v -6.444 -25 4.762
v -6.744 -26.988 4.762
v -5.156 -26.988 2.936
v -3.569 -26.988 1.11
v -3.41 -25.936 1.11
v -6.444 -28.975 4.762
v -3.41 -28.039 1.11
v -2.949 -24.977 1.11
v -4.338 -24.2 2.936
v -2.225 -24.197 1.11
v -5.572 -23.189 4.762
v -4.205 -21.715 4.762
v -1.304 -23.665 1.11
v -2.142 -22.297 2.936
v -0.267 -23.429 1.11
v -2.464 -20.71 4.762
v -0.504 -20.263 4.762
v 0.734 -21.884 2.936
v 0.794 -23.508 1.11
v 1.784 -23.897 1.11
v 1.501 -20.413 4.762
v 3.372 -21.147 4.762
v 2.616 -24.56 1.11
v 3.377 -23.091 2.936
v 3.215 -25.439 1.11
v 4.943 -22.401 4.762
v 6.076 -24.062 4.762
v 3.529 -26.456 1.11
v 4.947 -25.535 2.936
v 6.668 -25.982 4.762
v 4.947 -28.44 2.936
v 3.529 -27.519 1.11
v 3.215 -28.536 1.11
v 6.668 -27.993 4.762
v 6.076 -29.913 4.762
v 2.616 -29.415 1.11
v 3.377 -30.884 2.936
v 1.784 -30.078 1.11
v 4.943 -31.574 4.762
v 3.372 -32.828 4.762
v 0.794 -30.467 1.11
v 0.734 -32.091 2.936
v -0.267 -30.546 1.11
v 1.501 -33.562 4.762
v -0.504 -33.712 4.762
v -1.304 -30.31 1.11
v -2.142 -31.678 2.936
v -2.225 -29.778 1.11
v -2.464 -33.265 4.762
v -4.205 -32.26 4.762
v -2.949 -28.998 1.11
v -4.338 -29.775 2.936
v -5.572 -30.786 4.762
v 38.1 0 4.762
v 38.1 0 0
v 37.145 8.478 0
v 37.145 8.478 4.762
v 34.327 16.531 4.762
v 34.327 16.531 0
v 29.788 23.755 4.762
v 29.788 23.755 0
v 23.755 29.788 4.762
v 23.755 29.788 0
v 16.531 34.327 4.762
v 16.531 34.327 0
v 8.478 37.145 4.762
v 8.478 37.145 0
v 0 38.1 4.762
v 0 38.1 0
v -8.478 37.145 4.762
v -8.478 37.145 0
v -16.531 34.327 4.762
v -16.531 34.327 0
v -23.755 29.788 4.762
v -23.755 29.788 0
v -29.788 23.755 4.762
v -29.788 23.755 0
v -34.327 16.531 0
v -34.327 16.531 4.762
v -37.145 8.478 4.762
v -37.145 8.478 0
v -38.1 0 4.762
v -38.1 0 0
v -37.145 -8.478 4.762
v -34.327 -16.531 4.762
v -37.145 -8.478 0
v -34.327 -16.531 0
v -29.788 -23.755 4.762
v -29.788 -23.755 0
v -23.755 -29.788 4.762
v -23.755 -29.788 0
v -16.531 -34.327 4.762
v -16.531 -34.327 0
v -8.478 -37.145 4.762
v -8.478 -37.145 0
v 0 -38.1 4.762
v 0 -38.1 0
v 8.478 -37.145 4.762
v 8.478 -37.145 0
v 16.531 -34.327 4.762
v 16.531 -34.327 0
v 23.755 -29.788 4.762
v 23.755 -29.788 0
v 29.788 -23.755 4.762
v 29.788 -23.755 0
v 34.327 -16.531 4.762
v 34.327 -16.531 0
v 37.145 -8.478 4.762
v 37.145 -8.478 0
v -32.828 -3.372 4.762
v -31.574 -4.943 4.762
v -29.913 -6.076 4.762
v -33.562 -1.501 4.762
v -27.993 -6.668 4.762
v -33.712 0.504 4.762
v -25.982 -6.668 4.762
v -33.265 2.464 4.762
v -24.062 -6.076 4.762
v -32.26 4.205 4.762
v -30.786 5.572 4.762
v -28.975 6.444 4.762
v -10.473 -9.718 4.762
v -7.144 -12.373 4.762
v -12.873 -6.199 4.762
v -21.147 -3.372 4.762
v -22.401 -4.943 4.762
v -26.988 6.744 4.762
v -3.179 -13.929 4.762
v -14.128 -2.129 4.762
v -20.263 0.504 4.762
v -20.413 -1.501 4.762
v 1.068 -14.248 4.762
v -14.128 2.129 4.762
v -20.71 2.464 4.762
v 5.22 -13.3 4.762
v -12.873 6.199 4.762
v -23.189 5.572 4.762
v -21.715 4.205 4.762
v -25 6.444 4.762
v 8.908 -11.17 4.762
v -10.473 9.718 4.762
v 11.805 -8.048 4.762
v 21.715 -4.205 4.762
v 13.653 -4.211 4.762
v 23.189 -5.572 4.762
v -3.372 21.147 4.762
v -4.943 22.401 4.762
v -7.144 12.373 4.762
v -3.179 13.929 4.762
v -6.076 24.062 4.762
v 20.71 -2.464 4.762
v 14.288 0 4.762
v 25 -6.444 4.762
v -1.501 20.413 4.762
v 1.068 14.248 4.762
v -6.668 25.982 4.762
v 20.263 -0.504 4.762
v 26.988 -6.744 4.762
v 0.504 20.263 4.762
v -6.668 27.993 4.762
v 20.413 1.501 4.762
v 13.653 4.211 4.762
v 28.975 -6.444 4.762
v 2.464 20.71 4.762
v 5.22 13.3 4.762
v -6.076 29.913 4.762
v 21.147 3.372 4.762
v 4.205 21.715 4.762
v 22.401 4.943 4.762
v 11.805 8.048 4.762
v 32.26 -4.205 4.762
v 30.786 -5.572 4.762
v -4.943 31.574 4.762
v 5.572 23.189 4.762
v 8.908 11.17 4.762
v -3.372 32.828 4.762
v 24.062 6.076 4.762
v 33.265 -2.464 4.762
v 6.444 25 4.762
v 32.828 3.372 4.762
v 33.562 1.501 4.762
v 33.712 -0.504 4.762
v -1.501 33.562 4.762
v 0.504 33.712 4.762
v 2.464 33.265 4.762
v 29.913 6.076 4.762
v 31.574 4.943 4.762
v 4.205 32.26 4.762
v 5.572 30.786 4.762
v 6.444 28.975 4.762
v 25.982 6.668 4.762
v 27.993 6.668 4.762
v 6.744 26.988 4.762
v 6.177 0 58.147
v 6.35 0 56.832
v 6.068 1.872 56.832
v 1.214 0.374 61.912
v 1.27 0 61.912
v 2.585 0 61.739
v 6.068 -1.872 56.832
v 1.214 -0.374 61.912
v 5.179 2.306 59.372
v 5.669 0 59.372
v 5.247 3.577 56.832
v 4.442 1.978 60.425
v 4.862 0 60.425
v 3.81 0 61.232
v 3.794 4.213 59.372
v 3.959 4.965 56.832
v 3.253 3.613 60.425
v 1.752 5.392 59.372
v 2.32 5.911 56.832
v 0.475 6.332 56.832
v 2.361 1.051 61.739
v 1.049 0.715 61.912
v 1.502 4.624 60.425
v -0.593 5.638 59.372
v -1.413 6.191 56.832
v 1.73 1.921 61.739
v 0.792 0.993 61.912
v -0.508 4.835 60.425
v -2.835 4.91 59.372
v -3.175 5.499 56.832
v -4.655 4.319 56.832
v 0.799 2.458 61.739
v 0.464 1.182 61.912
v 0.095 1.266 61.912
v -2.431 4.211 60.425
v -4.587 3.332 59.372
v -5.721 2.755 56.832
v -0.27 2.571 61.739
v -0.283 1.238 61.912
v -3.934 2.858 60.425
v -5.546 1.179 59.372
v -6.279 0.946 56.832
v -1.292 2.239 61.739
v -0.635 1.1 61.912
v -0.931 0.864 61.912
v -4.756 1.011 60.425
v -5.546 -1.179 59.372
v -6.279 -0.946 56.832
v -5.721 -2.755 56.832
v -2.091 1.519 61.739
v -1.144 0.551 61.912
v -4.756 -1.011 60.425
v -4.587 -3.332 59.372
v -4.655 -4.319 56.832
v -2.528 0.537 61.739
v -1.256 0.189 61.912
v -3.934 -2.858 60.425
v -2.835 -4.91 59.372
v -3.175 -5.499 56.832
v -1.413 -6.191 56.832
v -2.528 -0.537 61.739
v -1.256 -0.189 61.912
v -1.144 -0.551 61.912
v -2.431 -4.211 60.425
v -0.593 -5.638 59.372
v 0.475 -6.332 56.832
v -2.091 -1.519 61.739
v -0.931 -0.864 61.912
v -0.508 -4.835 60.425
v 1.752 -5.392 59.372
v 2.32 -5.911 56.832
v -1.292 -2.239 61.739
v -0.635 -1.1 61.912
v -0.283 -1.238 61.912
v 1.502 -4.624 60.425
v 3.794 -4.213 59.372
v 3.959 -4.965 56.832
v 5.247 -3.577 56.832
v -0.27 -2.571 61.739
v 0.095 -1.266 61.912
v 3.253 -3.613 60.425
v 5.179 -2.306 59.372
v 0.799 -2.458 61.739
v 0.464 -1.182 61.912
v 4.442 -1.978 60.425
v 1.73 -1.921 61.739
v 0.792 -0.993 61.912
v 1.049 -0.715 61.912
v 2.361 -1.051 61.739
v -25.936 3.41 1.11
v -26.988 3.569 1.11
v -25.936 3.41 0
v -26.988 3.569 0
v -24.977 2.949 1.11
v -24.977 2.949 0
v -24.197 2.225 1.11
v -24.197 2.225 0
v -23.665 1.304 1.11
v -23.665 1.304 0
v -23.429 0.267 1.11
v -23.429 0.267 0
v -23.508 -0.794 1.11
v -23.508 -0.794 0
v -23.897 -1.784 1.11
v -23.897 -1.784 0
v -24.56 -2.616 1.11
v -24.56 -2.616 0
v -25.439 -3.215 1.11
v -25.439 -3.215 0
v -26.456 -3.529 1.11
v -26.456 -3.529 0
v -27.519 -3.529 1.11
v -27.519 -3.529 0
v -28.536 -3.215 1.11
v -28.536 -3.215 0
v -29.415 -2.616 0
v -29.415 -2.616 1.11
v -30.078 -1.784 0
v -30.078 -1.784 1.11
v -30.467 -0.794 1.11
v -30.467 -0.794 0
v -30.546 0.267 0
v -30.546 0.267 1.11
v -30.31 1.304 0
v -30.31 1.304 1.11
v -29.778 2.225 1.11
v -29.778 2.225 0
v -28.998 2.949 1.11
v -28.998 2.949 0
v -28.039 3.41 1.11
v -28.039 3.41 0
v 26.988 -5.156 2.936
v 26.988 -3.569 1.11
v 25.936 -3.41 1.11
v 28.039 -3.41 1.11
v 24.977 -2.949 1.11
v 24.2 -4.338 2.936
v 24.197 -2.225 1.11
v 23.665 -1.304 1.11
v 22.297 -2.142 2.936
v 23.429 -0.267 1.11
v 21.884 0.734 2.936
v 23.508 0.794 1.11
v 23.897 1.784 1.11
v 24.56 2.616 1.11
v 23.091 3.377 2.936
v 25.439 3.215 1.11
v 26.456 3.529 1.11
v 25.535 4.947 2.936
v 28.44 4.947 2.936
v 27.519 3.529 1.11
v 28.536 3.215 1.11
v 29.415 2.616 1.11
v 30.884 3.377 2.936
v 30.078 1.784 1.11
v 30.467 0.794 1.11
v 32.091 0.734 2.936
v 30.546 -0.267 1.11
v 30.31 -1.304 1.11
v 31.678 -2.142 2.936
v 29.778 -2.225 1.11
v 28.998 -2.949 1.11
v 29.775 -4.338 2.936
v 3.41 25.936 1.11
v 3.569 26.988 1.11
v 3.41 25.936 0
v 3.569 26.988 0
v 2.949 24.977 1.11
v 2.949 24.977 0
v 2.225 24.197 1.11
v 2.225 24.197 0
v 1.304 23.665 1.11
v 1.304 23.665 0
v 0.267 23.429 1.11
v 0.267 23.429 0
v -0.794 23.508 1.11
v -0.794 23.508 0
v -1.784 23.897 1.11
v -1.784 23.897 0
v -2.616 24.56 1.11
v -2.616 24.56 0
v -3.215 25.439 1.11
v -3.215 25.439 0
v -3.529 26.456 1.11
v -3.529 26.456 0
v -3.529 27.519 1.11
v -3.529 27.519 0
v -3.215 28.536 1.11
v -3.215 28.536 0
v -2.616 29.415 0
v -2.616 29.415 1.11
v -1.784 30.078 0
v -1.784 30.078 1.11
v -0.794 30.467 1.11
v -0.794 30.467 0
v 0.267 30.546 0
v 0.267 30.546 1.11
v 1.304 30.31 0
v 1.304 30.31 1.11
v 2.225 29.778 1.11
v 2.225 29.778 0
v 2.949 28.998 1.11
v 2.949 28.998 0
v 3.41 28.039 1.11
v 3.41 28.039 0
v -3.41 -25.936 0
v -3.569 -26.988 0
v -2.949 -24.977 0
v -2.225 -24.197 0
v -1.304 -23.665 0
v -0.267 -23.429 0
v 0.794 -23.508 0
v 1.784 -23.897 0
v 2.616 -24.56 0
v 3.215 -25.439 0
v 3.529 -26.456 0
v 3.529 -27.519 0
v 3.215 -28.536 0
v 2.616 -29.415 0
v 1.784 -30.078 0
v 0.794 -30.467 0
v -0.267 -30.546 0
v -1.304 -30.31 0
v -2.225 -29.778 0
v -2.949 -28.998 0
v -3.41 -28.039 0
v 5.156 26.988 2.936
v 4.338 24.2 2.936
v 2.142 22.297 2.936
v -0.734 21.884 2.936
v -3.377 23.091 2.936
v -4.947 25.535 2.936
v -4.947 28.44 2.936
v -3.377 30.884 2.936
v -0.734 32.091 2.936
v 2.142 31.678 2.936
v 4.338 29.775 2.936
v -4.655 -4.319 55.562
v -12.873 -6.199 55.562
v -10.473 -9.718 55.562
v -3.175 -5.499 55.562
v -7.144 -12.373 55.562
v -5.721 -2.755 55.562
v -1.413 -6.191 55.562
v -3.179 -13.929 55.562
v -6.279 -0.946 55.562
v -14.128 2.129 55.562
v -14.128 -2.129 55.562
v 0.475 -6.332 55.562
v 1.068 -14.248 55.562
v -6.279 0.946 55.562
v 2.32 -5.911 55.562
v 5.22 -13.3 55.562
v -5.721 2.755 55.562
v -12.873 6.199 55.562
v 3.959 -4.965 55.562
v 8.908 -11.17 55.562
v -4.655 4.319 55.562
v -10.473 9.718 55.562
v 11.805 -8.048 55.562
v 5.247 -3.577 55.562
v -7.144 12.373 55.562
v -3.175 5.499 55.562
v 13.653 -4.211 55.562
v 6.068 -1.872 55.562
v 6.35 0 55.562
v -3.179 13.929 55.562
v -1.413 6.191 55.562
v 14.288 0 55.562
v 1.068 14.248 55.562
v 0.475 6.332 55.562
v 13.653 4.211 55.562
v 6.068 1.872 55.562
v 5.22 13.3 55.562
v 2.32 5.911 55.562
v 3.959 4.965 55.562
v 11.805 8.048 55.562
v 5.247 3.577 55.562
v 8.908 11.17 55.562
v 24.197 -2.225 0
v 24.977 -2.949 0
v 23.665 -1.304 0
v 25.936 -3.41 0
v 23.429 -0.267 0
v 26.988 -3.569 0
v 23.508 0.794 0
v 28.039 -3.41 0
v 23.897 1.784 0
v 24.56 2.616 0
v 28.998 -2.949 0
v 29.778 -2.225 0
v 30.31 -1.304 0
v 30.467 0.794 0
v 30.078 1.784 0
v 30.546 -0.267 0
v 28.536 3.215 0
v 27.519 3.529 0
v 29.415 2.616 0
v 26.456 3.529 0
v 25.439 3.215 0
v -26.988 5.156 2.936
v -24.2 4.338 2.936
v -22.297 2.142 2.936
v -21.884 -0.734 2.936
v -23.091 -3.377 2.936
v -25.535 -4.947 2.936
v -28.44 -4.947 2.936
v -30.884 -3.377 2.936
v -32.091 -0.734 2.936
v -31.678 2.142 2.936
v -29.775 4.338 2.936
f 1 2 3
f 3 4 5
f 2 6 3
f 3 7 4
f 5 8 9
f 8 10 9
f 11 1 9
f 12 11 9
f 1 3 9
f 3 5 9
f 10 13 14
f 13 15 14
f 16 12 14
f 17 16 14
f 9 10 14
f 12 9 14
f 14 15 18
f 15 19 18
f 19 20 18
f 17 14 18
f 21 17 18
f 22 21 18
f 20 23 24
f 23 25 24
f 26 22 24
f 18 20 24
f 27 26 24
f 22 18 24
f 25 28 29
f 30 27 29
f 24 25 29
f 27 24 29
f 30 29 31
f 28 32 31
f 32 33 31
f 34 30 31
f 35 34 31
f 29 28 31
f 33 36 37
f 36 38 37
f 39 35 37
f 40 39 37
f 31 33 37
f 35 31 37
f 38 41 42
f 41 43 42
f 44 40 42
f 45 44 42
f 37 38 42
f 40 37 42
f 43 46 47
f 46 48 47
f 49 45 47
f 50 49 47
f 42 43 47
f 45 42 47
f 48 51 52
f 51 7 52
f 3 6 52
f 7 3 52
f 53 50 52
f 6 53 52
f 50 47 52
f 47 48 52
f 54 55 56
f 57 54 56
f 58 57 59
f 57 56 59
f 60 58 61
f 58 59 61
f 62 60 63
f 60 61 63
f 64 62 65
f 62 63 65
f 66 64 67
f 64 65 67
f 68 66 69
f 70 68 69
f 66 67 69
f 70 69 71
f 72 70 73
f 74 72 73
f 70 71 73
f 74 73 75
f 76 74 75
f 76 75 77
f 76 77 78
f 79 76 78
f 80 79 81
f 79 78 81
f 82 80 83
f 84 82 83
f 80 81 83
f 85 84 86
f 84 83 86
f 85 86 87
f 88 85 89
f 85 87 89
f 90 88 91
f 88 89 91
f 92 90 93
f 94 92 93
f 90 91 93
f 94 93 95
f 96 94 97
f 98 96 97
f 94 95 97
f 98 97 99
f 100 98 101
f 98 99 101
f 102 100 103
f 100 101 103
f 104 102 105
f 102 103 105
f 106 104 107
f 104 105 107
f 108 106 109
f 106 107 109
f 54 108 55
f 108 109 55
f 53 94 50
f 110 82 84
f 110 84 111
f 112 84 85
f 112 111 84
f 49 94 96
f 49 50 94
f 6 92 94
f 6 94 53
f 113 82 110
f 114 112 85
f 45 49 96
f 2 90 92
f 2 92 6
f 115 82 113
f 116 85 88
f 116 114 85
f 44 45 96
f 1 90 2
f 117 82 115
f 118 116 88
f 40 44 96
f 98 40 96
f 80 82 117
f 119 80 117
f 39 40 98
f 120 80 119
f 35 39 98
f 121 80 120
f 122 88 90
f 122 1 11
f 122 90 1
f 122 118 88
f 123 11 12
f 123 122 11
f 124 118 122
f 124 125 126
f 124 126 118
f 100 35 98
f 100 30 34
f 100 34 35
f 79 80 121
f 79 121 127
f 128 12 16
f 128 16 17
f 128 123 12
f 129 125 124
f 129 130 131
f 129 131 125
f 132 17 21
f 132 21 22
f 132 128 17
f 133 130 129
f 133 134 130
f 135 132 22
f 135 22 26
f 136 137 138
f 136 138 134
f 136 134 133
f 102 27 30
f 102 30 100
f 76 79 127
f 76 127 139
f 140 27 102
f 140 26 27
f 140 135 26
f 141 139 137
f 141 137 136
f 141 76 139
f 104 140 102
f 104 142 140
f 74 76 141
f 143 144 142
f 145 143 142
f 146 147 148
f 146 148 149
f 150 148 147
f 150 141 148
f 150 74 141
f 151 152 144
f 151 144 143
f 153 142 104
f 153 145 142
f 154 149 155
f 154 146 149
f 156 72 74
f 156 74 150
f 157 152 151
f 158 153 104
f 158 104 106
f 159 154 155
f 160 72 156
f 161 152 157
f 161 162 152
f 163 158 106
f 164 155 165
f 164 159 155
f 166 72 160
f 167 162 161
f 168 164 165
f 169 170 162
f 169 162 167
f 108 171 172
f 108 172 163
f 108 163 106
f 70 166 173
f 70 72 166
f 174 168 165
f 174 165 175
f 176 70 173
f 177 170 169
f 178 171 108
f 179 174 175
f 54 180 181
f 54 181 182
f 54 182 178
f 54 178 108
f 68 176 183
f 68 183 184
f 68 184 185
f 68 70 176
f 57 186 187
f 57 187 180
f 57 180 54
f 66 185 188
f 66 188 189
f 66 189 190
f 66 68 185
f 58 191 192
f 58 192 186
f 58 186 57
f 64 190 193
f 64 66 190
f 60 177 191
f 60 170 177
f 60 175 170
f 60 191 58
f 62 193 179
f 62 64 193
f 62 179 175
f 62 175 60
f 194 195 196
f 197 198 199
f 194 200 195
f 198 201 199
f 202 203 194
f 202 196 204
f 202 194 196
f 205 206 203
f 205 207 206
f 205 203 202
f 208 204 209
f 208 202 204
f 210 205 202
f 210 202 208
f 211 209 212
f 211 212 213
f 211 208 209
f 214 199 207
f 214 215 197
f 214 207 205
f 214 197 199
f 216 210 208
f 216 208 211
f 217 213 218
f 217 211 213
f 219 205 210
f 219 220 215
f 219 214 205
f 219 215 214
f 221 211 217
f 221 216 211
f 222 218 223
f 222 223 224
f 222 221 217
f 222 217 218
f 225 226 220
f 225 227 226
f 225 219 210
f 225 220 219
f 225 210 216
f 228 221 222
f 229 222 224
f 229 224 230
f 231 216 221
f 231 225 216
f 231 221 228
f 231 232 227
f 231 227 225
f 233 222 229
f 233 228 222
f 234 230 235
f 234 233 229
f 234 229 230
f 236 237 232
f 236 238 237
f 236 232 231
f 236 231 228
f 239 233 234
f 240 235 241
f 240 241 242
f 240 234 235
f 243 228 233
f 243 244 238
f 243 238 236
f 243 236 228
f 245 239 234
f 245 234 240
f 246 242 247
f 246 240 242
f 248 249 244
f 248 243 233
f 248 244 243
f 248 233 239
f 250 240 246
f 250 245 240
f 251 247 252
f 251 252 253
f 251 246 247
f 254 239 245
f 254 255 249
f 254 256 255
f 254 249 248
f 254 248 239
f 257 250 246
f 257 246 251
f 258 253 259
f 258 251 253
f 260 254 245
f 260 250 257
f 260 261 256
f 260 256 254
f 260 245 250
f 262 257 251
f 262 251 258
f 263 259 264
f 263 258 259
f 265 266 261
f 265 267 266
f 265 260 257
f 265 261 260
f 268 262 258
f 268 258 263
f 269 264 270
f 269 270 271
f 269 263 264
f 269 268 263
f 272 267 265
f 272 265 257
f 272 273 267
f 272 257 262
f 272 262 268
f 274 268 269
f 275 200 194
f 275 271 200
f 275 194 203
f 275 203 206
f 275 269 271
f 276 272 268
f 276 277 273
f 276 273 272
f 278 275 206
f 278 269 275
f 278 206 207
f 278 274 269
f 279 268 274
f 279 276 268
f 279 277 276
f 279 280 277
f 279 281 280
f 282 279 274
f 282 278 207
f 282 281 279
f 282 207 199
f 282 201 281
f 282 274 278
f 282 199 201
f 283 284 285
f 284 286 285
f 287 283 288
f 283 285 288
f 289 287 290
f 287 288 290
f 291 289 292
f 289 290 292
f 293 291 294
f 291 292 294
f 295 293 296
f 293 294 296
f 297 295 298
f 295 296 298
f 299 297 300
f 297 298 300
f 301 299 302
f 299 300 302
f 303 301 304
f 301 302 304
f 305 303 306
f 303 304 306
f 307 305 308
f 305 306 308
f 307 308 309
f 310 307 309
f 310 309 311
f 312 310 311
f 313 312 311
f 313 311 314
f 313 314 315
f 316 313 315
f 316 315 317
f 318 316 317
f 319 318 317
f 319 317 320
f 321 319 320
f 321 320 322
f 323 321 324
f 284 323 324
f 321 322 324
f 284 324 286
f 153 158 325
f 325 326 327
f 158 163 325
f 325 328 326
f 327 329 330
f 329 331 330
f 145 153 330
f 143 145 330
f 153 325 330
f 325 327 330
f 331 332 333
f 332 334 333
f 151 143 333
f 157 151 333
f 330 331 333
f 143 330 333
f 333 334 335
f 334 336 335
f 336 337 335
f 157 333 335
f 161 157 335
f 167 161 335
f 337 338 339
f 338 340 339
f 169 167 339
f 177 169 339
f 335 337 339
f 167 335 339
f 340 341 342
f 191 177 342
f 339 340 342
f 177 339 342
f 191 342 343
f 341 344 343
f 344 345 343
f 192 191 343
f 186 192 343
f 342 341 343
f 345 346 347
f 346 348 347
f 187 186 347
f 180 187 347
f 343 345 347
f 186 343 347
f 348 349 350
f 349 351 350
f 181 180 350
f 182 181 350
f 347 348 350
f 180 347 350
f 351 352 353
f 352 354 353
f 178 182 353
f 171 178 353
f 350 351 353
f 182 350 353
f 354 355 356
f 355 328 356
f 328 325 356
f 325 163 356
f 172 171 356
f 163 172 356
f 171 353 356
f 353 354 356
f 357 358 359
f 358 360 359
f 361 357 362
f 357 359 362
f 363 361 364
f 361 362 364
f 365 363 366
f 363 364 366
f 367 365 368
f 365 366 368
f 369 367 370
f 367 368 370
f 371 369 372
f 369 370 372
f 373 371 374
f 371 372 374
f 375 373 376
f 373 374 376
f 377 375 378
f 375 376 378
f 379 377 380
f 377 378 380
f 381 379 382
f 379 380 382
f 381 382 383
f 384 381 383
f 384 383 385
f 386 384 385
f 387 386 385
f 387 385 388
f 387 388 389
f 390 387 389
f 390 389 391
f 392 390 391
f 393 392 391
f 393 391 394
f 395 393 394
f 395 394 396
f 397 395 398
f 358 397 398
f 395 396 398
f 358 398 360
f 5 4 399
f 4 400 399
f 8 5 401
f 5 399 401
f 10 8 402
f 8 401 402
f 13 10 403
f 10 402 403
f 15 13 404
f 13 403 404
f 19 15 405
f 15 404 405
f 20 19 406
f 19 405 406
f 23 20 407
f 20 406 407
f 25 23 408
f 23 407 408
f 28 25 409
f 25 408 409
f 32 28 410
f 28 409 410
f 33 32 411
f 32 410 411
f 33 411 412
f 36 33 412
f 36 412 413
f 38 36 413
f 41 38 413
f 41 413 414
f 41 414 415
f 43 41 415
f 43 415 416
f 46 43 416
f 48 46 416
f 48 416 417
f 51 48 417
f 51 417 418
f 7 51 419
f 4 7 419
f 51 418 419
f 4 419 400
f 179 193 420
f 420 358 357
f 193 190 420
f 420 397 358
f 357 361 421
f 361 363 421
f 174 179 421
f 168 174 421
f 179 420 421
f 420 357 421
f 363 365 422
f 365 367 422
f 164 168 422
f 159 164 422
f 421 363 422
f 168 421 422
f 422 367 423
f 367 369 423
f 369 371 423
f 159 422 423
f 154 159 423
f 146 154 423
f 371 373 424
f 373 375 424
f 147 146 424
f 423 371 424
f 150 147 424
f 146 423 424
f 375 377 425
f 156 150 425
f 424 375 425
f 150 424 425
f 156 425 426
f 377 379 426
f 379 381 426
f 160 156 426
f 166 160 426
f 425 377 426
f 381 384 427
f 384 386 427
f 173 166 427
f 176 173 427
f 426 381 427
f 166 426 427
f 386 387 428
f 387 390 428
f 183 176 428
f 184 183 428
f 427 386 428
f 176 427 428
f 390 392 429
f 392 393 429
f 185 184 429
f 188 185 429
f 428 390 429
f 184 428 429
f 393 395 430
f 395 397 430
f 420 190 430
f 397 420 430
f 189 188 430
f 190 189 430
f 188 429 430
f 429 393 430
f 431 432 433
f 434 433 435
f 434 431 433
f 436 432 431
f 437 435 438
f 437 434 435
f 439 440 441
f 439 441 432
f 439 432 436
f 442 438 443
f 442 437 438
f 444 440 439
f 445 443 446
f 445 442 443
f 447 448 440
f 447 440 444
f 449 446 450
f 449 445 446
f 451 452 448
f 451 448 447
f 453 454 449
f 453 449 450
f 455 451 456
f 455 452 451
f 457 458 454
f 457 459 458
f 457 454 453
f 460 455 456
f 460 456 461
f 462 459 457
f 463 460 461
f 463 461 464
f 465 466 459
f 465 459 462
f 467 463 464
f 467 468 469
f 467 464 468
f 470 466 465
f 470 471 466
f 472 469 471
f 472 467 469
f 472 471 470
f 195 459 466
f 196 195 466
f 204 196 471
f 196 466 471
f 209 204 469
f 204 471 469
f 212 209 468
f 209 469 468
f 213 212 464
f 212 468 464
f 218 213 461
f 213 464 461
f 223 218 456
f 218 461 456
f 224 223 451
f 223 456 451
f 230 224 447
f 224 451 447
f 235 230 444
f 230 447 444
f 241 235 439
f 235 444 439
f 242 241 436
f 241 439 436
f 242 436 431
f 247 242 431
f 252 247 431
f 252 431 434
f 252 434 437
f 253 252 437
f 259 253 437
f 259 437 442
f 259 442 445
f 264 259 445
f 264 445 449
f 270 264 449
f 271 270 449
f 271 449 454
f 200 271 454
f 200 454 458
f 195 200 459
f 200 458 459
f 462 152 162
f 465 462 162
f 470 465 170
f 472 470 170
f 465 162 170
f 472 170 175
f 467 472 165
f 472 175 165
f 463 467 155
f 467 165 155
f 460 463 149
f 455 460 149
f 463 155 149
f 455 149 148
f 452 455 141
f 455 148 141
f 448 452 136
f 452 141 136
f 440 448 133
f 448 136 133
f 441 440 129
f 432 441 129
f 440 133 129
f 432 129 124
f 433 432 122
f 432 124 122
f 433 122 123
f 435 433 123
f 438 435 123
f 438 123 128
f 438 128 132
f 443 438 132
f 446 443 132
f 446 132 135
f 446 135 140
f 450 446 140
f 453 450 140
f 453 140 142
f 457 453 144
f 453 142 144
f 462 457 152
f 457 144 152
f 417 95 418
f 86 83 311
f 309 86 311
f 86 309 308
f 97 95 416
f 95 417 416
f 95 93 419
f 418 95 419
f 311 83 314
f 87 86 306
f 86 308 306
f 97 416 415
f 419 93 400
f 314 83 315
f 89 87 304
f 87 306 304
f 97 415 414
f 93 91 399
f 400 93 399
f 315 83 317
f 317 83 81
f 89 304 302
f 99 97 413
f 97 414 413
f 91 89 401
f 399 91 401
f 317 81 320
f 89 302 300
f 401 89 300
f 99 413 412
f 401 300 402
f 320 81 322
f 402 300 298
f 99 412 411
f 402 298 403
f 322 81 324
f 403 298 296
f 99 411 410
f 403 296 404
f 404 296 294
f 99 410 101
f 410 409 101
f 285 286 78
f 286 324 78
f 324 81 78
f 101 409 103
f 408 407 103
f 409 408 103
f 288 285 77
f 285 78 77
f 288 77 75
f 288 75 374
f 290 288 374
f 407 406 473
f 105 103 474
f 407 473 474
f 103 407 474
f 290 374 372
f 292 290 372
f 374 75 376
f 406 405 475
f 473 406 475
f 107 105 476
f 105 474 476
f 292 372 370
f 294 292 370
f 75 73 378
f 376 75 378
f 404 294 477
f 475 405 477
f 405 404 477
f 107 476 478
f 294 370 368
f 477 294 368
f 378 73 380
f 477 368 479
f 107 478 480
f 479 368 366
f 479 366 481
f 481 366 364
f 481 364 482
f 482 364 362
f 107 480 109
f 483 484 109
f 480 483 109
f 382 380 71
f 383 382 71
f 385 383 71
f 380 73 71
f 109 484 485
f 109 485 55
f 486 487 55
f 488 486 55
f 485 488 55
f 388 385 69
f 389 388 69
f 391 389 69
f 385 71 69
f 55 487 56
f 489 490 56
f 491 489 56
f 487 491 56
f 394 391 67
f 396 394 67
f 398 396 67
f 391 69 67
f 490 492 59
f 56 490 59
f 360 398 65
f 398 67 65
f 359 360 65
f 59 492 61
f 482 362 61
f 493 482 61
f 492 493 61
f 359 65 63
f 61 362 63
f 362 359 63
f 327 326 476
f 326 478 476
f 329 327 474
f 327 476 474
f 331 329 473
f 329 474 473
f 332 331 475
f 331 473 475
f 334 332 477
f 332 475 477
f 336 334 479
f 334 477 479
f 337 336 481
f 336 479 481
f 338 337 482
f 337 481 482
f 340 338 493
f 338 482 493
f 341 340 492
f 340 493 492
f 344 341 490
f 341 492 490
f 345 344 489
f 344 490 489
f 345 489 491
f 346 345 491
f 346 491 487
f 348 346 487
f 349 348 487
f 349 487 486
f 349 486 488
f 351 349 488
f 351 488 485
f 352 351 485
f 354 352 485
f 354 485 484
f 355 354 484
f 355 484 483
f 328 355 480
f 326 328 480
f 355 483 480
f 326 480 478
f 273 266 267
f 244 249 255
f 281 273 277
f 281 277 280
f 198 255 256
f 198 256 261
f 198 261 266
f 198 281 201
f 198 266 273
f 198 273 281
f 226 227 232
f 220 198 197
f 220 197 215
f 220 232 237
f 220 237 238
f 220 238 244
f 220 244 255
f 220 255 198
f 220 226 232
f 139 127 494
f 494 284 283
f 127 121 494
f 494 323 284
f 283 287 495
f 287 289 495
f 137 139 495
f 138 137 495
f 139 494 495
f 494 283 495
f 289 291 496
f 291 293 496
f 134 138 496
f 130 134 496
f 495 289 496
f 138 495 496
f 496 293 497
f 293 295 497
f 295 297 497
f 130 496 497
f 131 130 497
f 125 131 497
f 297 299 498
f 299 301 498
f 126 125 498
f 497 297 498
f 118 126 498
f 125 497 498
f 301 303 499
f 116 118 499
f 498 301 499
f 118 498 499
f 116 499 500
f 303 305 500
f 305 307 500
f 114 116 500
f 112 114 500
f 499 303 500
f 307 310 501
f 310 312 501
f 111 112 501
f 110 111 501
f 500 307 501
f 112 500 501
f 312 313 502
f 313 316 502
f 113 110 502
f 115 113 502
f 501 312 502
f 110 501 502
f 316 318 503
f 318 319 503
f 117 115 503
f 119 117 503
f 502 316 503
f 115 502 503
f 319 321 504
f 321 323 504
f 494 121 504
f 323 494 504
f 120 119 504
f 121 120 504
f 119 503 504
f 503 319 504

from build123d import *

# Parameters (mm, degrees)
F0_R            = 38.1
F1_DEPTH        = 4.7625
F2_R            = 14.2875
F3_DEPTH        = 50.8
F4_R            = 6.35
F5_DEPTH        = 6.35
F6_R            = 5.08
F8_D            = 7.1374
F8_DEPTH        = 15.875
F8_CSINK_D      = 13.4874
F8_CSINK_ANGLE  = 82
F8_TIP          = 2.1442912911
F8_COPIES_COUNT = 4


# Not quite as in the source:
# - a pattern or mirror of a feature is missing from the dataset's text; its kind, count and spacing are read off the source's solid


with BuildPart() as f1:
    # F0 (on Top) → F1 (new body)
    with BuildSketch(Plane.XY):
        Circle(F0_R)
    extrude(amount=F1_DEPTH)

    # F2 (on face) → F3 (join)
    with BuildSketch(Plane.XY.offset(4.7625)):
        Circle(F2_R)
    extrude(amount=F3_DEPTH)

    # F4 (on face) → F5 (join)
    with BuildSketch(Plane.XY.offset(55.5625)):
        Circle(F4_R)
    extrude(amount=F5_DEPTH)

    # F6
    f6_edges = [f1.edges().sort_by_distance(p)[0] for p in [
        (-6.35, 0, 61.9125),
    ]]
    fillet(f6_edges, radius=F6_R)

    # F8
    with Locations(Plane.XY.offset(4.7625)):
        with Locations((0, -26.9875)):
            f8 = CounterSinkHole(F8_D / 2, F8_CSINK_D / 2, depth=F8_DEPTH, counter_sink_angle=F8_CSINK_ANGLE)
            with Locations((0, 0, -(F8_DEPTH + F8_TIP / 2))):  # 118° drill point
                Cone(0, F8_D / 2, F8_TIP, mode=Mode.SUBTRACT)

    # F8_copies: F8 ×4 about axis
    f8_copies_axis = Axis((0, 0, 0), (0, 0, 1))
    for i in range(1, F8_COPIES_COUNT):
        add(f8.rotate(f8_copies_axis, i * 360 / F8_COPIES_COUNT), mode=Mode.SUBTRACT)


solid = f1.part
